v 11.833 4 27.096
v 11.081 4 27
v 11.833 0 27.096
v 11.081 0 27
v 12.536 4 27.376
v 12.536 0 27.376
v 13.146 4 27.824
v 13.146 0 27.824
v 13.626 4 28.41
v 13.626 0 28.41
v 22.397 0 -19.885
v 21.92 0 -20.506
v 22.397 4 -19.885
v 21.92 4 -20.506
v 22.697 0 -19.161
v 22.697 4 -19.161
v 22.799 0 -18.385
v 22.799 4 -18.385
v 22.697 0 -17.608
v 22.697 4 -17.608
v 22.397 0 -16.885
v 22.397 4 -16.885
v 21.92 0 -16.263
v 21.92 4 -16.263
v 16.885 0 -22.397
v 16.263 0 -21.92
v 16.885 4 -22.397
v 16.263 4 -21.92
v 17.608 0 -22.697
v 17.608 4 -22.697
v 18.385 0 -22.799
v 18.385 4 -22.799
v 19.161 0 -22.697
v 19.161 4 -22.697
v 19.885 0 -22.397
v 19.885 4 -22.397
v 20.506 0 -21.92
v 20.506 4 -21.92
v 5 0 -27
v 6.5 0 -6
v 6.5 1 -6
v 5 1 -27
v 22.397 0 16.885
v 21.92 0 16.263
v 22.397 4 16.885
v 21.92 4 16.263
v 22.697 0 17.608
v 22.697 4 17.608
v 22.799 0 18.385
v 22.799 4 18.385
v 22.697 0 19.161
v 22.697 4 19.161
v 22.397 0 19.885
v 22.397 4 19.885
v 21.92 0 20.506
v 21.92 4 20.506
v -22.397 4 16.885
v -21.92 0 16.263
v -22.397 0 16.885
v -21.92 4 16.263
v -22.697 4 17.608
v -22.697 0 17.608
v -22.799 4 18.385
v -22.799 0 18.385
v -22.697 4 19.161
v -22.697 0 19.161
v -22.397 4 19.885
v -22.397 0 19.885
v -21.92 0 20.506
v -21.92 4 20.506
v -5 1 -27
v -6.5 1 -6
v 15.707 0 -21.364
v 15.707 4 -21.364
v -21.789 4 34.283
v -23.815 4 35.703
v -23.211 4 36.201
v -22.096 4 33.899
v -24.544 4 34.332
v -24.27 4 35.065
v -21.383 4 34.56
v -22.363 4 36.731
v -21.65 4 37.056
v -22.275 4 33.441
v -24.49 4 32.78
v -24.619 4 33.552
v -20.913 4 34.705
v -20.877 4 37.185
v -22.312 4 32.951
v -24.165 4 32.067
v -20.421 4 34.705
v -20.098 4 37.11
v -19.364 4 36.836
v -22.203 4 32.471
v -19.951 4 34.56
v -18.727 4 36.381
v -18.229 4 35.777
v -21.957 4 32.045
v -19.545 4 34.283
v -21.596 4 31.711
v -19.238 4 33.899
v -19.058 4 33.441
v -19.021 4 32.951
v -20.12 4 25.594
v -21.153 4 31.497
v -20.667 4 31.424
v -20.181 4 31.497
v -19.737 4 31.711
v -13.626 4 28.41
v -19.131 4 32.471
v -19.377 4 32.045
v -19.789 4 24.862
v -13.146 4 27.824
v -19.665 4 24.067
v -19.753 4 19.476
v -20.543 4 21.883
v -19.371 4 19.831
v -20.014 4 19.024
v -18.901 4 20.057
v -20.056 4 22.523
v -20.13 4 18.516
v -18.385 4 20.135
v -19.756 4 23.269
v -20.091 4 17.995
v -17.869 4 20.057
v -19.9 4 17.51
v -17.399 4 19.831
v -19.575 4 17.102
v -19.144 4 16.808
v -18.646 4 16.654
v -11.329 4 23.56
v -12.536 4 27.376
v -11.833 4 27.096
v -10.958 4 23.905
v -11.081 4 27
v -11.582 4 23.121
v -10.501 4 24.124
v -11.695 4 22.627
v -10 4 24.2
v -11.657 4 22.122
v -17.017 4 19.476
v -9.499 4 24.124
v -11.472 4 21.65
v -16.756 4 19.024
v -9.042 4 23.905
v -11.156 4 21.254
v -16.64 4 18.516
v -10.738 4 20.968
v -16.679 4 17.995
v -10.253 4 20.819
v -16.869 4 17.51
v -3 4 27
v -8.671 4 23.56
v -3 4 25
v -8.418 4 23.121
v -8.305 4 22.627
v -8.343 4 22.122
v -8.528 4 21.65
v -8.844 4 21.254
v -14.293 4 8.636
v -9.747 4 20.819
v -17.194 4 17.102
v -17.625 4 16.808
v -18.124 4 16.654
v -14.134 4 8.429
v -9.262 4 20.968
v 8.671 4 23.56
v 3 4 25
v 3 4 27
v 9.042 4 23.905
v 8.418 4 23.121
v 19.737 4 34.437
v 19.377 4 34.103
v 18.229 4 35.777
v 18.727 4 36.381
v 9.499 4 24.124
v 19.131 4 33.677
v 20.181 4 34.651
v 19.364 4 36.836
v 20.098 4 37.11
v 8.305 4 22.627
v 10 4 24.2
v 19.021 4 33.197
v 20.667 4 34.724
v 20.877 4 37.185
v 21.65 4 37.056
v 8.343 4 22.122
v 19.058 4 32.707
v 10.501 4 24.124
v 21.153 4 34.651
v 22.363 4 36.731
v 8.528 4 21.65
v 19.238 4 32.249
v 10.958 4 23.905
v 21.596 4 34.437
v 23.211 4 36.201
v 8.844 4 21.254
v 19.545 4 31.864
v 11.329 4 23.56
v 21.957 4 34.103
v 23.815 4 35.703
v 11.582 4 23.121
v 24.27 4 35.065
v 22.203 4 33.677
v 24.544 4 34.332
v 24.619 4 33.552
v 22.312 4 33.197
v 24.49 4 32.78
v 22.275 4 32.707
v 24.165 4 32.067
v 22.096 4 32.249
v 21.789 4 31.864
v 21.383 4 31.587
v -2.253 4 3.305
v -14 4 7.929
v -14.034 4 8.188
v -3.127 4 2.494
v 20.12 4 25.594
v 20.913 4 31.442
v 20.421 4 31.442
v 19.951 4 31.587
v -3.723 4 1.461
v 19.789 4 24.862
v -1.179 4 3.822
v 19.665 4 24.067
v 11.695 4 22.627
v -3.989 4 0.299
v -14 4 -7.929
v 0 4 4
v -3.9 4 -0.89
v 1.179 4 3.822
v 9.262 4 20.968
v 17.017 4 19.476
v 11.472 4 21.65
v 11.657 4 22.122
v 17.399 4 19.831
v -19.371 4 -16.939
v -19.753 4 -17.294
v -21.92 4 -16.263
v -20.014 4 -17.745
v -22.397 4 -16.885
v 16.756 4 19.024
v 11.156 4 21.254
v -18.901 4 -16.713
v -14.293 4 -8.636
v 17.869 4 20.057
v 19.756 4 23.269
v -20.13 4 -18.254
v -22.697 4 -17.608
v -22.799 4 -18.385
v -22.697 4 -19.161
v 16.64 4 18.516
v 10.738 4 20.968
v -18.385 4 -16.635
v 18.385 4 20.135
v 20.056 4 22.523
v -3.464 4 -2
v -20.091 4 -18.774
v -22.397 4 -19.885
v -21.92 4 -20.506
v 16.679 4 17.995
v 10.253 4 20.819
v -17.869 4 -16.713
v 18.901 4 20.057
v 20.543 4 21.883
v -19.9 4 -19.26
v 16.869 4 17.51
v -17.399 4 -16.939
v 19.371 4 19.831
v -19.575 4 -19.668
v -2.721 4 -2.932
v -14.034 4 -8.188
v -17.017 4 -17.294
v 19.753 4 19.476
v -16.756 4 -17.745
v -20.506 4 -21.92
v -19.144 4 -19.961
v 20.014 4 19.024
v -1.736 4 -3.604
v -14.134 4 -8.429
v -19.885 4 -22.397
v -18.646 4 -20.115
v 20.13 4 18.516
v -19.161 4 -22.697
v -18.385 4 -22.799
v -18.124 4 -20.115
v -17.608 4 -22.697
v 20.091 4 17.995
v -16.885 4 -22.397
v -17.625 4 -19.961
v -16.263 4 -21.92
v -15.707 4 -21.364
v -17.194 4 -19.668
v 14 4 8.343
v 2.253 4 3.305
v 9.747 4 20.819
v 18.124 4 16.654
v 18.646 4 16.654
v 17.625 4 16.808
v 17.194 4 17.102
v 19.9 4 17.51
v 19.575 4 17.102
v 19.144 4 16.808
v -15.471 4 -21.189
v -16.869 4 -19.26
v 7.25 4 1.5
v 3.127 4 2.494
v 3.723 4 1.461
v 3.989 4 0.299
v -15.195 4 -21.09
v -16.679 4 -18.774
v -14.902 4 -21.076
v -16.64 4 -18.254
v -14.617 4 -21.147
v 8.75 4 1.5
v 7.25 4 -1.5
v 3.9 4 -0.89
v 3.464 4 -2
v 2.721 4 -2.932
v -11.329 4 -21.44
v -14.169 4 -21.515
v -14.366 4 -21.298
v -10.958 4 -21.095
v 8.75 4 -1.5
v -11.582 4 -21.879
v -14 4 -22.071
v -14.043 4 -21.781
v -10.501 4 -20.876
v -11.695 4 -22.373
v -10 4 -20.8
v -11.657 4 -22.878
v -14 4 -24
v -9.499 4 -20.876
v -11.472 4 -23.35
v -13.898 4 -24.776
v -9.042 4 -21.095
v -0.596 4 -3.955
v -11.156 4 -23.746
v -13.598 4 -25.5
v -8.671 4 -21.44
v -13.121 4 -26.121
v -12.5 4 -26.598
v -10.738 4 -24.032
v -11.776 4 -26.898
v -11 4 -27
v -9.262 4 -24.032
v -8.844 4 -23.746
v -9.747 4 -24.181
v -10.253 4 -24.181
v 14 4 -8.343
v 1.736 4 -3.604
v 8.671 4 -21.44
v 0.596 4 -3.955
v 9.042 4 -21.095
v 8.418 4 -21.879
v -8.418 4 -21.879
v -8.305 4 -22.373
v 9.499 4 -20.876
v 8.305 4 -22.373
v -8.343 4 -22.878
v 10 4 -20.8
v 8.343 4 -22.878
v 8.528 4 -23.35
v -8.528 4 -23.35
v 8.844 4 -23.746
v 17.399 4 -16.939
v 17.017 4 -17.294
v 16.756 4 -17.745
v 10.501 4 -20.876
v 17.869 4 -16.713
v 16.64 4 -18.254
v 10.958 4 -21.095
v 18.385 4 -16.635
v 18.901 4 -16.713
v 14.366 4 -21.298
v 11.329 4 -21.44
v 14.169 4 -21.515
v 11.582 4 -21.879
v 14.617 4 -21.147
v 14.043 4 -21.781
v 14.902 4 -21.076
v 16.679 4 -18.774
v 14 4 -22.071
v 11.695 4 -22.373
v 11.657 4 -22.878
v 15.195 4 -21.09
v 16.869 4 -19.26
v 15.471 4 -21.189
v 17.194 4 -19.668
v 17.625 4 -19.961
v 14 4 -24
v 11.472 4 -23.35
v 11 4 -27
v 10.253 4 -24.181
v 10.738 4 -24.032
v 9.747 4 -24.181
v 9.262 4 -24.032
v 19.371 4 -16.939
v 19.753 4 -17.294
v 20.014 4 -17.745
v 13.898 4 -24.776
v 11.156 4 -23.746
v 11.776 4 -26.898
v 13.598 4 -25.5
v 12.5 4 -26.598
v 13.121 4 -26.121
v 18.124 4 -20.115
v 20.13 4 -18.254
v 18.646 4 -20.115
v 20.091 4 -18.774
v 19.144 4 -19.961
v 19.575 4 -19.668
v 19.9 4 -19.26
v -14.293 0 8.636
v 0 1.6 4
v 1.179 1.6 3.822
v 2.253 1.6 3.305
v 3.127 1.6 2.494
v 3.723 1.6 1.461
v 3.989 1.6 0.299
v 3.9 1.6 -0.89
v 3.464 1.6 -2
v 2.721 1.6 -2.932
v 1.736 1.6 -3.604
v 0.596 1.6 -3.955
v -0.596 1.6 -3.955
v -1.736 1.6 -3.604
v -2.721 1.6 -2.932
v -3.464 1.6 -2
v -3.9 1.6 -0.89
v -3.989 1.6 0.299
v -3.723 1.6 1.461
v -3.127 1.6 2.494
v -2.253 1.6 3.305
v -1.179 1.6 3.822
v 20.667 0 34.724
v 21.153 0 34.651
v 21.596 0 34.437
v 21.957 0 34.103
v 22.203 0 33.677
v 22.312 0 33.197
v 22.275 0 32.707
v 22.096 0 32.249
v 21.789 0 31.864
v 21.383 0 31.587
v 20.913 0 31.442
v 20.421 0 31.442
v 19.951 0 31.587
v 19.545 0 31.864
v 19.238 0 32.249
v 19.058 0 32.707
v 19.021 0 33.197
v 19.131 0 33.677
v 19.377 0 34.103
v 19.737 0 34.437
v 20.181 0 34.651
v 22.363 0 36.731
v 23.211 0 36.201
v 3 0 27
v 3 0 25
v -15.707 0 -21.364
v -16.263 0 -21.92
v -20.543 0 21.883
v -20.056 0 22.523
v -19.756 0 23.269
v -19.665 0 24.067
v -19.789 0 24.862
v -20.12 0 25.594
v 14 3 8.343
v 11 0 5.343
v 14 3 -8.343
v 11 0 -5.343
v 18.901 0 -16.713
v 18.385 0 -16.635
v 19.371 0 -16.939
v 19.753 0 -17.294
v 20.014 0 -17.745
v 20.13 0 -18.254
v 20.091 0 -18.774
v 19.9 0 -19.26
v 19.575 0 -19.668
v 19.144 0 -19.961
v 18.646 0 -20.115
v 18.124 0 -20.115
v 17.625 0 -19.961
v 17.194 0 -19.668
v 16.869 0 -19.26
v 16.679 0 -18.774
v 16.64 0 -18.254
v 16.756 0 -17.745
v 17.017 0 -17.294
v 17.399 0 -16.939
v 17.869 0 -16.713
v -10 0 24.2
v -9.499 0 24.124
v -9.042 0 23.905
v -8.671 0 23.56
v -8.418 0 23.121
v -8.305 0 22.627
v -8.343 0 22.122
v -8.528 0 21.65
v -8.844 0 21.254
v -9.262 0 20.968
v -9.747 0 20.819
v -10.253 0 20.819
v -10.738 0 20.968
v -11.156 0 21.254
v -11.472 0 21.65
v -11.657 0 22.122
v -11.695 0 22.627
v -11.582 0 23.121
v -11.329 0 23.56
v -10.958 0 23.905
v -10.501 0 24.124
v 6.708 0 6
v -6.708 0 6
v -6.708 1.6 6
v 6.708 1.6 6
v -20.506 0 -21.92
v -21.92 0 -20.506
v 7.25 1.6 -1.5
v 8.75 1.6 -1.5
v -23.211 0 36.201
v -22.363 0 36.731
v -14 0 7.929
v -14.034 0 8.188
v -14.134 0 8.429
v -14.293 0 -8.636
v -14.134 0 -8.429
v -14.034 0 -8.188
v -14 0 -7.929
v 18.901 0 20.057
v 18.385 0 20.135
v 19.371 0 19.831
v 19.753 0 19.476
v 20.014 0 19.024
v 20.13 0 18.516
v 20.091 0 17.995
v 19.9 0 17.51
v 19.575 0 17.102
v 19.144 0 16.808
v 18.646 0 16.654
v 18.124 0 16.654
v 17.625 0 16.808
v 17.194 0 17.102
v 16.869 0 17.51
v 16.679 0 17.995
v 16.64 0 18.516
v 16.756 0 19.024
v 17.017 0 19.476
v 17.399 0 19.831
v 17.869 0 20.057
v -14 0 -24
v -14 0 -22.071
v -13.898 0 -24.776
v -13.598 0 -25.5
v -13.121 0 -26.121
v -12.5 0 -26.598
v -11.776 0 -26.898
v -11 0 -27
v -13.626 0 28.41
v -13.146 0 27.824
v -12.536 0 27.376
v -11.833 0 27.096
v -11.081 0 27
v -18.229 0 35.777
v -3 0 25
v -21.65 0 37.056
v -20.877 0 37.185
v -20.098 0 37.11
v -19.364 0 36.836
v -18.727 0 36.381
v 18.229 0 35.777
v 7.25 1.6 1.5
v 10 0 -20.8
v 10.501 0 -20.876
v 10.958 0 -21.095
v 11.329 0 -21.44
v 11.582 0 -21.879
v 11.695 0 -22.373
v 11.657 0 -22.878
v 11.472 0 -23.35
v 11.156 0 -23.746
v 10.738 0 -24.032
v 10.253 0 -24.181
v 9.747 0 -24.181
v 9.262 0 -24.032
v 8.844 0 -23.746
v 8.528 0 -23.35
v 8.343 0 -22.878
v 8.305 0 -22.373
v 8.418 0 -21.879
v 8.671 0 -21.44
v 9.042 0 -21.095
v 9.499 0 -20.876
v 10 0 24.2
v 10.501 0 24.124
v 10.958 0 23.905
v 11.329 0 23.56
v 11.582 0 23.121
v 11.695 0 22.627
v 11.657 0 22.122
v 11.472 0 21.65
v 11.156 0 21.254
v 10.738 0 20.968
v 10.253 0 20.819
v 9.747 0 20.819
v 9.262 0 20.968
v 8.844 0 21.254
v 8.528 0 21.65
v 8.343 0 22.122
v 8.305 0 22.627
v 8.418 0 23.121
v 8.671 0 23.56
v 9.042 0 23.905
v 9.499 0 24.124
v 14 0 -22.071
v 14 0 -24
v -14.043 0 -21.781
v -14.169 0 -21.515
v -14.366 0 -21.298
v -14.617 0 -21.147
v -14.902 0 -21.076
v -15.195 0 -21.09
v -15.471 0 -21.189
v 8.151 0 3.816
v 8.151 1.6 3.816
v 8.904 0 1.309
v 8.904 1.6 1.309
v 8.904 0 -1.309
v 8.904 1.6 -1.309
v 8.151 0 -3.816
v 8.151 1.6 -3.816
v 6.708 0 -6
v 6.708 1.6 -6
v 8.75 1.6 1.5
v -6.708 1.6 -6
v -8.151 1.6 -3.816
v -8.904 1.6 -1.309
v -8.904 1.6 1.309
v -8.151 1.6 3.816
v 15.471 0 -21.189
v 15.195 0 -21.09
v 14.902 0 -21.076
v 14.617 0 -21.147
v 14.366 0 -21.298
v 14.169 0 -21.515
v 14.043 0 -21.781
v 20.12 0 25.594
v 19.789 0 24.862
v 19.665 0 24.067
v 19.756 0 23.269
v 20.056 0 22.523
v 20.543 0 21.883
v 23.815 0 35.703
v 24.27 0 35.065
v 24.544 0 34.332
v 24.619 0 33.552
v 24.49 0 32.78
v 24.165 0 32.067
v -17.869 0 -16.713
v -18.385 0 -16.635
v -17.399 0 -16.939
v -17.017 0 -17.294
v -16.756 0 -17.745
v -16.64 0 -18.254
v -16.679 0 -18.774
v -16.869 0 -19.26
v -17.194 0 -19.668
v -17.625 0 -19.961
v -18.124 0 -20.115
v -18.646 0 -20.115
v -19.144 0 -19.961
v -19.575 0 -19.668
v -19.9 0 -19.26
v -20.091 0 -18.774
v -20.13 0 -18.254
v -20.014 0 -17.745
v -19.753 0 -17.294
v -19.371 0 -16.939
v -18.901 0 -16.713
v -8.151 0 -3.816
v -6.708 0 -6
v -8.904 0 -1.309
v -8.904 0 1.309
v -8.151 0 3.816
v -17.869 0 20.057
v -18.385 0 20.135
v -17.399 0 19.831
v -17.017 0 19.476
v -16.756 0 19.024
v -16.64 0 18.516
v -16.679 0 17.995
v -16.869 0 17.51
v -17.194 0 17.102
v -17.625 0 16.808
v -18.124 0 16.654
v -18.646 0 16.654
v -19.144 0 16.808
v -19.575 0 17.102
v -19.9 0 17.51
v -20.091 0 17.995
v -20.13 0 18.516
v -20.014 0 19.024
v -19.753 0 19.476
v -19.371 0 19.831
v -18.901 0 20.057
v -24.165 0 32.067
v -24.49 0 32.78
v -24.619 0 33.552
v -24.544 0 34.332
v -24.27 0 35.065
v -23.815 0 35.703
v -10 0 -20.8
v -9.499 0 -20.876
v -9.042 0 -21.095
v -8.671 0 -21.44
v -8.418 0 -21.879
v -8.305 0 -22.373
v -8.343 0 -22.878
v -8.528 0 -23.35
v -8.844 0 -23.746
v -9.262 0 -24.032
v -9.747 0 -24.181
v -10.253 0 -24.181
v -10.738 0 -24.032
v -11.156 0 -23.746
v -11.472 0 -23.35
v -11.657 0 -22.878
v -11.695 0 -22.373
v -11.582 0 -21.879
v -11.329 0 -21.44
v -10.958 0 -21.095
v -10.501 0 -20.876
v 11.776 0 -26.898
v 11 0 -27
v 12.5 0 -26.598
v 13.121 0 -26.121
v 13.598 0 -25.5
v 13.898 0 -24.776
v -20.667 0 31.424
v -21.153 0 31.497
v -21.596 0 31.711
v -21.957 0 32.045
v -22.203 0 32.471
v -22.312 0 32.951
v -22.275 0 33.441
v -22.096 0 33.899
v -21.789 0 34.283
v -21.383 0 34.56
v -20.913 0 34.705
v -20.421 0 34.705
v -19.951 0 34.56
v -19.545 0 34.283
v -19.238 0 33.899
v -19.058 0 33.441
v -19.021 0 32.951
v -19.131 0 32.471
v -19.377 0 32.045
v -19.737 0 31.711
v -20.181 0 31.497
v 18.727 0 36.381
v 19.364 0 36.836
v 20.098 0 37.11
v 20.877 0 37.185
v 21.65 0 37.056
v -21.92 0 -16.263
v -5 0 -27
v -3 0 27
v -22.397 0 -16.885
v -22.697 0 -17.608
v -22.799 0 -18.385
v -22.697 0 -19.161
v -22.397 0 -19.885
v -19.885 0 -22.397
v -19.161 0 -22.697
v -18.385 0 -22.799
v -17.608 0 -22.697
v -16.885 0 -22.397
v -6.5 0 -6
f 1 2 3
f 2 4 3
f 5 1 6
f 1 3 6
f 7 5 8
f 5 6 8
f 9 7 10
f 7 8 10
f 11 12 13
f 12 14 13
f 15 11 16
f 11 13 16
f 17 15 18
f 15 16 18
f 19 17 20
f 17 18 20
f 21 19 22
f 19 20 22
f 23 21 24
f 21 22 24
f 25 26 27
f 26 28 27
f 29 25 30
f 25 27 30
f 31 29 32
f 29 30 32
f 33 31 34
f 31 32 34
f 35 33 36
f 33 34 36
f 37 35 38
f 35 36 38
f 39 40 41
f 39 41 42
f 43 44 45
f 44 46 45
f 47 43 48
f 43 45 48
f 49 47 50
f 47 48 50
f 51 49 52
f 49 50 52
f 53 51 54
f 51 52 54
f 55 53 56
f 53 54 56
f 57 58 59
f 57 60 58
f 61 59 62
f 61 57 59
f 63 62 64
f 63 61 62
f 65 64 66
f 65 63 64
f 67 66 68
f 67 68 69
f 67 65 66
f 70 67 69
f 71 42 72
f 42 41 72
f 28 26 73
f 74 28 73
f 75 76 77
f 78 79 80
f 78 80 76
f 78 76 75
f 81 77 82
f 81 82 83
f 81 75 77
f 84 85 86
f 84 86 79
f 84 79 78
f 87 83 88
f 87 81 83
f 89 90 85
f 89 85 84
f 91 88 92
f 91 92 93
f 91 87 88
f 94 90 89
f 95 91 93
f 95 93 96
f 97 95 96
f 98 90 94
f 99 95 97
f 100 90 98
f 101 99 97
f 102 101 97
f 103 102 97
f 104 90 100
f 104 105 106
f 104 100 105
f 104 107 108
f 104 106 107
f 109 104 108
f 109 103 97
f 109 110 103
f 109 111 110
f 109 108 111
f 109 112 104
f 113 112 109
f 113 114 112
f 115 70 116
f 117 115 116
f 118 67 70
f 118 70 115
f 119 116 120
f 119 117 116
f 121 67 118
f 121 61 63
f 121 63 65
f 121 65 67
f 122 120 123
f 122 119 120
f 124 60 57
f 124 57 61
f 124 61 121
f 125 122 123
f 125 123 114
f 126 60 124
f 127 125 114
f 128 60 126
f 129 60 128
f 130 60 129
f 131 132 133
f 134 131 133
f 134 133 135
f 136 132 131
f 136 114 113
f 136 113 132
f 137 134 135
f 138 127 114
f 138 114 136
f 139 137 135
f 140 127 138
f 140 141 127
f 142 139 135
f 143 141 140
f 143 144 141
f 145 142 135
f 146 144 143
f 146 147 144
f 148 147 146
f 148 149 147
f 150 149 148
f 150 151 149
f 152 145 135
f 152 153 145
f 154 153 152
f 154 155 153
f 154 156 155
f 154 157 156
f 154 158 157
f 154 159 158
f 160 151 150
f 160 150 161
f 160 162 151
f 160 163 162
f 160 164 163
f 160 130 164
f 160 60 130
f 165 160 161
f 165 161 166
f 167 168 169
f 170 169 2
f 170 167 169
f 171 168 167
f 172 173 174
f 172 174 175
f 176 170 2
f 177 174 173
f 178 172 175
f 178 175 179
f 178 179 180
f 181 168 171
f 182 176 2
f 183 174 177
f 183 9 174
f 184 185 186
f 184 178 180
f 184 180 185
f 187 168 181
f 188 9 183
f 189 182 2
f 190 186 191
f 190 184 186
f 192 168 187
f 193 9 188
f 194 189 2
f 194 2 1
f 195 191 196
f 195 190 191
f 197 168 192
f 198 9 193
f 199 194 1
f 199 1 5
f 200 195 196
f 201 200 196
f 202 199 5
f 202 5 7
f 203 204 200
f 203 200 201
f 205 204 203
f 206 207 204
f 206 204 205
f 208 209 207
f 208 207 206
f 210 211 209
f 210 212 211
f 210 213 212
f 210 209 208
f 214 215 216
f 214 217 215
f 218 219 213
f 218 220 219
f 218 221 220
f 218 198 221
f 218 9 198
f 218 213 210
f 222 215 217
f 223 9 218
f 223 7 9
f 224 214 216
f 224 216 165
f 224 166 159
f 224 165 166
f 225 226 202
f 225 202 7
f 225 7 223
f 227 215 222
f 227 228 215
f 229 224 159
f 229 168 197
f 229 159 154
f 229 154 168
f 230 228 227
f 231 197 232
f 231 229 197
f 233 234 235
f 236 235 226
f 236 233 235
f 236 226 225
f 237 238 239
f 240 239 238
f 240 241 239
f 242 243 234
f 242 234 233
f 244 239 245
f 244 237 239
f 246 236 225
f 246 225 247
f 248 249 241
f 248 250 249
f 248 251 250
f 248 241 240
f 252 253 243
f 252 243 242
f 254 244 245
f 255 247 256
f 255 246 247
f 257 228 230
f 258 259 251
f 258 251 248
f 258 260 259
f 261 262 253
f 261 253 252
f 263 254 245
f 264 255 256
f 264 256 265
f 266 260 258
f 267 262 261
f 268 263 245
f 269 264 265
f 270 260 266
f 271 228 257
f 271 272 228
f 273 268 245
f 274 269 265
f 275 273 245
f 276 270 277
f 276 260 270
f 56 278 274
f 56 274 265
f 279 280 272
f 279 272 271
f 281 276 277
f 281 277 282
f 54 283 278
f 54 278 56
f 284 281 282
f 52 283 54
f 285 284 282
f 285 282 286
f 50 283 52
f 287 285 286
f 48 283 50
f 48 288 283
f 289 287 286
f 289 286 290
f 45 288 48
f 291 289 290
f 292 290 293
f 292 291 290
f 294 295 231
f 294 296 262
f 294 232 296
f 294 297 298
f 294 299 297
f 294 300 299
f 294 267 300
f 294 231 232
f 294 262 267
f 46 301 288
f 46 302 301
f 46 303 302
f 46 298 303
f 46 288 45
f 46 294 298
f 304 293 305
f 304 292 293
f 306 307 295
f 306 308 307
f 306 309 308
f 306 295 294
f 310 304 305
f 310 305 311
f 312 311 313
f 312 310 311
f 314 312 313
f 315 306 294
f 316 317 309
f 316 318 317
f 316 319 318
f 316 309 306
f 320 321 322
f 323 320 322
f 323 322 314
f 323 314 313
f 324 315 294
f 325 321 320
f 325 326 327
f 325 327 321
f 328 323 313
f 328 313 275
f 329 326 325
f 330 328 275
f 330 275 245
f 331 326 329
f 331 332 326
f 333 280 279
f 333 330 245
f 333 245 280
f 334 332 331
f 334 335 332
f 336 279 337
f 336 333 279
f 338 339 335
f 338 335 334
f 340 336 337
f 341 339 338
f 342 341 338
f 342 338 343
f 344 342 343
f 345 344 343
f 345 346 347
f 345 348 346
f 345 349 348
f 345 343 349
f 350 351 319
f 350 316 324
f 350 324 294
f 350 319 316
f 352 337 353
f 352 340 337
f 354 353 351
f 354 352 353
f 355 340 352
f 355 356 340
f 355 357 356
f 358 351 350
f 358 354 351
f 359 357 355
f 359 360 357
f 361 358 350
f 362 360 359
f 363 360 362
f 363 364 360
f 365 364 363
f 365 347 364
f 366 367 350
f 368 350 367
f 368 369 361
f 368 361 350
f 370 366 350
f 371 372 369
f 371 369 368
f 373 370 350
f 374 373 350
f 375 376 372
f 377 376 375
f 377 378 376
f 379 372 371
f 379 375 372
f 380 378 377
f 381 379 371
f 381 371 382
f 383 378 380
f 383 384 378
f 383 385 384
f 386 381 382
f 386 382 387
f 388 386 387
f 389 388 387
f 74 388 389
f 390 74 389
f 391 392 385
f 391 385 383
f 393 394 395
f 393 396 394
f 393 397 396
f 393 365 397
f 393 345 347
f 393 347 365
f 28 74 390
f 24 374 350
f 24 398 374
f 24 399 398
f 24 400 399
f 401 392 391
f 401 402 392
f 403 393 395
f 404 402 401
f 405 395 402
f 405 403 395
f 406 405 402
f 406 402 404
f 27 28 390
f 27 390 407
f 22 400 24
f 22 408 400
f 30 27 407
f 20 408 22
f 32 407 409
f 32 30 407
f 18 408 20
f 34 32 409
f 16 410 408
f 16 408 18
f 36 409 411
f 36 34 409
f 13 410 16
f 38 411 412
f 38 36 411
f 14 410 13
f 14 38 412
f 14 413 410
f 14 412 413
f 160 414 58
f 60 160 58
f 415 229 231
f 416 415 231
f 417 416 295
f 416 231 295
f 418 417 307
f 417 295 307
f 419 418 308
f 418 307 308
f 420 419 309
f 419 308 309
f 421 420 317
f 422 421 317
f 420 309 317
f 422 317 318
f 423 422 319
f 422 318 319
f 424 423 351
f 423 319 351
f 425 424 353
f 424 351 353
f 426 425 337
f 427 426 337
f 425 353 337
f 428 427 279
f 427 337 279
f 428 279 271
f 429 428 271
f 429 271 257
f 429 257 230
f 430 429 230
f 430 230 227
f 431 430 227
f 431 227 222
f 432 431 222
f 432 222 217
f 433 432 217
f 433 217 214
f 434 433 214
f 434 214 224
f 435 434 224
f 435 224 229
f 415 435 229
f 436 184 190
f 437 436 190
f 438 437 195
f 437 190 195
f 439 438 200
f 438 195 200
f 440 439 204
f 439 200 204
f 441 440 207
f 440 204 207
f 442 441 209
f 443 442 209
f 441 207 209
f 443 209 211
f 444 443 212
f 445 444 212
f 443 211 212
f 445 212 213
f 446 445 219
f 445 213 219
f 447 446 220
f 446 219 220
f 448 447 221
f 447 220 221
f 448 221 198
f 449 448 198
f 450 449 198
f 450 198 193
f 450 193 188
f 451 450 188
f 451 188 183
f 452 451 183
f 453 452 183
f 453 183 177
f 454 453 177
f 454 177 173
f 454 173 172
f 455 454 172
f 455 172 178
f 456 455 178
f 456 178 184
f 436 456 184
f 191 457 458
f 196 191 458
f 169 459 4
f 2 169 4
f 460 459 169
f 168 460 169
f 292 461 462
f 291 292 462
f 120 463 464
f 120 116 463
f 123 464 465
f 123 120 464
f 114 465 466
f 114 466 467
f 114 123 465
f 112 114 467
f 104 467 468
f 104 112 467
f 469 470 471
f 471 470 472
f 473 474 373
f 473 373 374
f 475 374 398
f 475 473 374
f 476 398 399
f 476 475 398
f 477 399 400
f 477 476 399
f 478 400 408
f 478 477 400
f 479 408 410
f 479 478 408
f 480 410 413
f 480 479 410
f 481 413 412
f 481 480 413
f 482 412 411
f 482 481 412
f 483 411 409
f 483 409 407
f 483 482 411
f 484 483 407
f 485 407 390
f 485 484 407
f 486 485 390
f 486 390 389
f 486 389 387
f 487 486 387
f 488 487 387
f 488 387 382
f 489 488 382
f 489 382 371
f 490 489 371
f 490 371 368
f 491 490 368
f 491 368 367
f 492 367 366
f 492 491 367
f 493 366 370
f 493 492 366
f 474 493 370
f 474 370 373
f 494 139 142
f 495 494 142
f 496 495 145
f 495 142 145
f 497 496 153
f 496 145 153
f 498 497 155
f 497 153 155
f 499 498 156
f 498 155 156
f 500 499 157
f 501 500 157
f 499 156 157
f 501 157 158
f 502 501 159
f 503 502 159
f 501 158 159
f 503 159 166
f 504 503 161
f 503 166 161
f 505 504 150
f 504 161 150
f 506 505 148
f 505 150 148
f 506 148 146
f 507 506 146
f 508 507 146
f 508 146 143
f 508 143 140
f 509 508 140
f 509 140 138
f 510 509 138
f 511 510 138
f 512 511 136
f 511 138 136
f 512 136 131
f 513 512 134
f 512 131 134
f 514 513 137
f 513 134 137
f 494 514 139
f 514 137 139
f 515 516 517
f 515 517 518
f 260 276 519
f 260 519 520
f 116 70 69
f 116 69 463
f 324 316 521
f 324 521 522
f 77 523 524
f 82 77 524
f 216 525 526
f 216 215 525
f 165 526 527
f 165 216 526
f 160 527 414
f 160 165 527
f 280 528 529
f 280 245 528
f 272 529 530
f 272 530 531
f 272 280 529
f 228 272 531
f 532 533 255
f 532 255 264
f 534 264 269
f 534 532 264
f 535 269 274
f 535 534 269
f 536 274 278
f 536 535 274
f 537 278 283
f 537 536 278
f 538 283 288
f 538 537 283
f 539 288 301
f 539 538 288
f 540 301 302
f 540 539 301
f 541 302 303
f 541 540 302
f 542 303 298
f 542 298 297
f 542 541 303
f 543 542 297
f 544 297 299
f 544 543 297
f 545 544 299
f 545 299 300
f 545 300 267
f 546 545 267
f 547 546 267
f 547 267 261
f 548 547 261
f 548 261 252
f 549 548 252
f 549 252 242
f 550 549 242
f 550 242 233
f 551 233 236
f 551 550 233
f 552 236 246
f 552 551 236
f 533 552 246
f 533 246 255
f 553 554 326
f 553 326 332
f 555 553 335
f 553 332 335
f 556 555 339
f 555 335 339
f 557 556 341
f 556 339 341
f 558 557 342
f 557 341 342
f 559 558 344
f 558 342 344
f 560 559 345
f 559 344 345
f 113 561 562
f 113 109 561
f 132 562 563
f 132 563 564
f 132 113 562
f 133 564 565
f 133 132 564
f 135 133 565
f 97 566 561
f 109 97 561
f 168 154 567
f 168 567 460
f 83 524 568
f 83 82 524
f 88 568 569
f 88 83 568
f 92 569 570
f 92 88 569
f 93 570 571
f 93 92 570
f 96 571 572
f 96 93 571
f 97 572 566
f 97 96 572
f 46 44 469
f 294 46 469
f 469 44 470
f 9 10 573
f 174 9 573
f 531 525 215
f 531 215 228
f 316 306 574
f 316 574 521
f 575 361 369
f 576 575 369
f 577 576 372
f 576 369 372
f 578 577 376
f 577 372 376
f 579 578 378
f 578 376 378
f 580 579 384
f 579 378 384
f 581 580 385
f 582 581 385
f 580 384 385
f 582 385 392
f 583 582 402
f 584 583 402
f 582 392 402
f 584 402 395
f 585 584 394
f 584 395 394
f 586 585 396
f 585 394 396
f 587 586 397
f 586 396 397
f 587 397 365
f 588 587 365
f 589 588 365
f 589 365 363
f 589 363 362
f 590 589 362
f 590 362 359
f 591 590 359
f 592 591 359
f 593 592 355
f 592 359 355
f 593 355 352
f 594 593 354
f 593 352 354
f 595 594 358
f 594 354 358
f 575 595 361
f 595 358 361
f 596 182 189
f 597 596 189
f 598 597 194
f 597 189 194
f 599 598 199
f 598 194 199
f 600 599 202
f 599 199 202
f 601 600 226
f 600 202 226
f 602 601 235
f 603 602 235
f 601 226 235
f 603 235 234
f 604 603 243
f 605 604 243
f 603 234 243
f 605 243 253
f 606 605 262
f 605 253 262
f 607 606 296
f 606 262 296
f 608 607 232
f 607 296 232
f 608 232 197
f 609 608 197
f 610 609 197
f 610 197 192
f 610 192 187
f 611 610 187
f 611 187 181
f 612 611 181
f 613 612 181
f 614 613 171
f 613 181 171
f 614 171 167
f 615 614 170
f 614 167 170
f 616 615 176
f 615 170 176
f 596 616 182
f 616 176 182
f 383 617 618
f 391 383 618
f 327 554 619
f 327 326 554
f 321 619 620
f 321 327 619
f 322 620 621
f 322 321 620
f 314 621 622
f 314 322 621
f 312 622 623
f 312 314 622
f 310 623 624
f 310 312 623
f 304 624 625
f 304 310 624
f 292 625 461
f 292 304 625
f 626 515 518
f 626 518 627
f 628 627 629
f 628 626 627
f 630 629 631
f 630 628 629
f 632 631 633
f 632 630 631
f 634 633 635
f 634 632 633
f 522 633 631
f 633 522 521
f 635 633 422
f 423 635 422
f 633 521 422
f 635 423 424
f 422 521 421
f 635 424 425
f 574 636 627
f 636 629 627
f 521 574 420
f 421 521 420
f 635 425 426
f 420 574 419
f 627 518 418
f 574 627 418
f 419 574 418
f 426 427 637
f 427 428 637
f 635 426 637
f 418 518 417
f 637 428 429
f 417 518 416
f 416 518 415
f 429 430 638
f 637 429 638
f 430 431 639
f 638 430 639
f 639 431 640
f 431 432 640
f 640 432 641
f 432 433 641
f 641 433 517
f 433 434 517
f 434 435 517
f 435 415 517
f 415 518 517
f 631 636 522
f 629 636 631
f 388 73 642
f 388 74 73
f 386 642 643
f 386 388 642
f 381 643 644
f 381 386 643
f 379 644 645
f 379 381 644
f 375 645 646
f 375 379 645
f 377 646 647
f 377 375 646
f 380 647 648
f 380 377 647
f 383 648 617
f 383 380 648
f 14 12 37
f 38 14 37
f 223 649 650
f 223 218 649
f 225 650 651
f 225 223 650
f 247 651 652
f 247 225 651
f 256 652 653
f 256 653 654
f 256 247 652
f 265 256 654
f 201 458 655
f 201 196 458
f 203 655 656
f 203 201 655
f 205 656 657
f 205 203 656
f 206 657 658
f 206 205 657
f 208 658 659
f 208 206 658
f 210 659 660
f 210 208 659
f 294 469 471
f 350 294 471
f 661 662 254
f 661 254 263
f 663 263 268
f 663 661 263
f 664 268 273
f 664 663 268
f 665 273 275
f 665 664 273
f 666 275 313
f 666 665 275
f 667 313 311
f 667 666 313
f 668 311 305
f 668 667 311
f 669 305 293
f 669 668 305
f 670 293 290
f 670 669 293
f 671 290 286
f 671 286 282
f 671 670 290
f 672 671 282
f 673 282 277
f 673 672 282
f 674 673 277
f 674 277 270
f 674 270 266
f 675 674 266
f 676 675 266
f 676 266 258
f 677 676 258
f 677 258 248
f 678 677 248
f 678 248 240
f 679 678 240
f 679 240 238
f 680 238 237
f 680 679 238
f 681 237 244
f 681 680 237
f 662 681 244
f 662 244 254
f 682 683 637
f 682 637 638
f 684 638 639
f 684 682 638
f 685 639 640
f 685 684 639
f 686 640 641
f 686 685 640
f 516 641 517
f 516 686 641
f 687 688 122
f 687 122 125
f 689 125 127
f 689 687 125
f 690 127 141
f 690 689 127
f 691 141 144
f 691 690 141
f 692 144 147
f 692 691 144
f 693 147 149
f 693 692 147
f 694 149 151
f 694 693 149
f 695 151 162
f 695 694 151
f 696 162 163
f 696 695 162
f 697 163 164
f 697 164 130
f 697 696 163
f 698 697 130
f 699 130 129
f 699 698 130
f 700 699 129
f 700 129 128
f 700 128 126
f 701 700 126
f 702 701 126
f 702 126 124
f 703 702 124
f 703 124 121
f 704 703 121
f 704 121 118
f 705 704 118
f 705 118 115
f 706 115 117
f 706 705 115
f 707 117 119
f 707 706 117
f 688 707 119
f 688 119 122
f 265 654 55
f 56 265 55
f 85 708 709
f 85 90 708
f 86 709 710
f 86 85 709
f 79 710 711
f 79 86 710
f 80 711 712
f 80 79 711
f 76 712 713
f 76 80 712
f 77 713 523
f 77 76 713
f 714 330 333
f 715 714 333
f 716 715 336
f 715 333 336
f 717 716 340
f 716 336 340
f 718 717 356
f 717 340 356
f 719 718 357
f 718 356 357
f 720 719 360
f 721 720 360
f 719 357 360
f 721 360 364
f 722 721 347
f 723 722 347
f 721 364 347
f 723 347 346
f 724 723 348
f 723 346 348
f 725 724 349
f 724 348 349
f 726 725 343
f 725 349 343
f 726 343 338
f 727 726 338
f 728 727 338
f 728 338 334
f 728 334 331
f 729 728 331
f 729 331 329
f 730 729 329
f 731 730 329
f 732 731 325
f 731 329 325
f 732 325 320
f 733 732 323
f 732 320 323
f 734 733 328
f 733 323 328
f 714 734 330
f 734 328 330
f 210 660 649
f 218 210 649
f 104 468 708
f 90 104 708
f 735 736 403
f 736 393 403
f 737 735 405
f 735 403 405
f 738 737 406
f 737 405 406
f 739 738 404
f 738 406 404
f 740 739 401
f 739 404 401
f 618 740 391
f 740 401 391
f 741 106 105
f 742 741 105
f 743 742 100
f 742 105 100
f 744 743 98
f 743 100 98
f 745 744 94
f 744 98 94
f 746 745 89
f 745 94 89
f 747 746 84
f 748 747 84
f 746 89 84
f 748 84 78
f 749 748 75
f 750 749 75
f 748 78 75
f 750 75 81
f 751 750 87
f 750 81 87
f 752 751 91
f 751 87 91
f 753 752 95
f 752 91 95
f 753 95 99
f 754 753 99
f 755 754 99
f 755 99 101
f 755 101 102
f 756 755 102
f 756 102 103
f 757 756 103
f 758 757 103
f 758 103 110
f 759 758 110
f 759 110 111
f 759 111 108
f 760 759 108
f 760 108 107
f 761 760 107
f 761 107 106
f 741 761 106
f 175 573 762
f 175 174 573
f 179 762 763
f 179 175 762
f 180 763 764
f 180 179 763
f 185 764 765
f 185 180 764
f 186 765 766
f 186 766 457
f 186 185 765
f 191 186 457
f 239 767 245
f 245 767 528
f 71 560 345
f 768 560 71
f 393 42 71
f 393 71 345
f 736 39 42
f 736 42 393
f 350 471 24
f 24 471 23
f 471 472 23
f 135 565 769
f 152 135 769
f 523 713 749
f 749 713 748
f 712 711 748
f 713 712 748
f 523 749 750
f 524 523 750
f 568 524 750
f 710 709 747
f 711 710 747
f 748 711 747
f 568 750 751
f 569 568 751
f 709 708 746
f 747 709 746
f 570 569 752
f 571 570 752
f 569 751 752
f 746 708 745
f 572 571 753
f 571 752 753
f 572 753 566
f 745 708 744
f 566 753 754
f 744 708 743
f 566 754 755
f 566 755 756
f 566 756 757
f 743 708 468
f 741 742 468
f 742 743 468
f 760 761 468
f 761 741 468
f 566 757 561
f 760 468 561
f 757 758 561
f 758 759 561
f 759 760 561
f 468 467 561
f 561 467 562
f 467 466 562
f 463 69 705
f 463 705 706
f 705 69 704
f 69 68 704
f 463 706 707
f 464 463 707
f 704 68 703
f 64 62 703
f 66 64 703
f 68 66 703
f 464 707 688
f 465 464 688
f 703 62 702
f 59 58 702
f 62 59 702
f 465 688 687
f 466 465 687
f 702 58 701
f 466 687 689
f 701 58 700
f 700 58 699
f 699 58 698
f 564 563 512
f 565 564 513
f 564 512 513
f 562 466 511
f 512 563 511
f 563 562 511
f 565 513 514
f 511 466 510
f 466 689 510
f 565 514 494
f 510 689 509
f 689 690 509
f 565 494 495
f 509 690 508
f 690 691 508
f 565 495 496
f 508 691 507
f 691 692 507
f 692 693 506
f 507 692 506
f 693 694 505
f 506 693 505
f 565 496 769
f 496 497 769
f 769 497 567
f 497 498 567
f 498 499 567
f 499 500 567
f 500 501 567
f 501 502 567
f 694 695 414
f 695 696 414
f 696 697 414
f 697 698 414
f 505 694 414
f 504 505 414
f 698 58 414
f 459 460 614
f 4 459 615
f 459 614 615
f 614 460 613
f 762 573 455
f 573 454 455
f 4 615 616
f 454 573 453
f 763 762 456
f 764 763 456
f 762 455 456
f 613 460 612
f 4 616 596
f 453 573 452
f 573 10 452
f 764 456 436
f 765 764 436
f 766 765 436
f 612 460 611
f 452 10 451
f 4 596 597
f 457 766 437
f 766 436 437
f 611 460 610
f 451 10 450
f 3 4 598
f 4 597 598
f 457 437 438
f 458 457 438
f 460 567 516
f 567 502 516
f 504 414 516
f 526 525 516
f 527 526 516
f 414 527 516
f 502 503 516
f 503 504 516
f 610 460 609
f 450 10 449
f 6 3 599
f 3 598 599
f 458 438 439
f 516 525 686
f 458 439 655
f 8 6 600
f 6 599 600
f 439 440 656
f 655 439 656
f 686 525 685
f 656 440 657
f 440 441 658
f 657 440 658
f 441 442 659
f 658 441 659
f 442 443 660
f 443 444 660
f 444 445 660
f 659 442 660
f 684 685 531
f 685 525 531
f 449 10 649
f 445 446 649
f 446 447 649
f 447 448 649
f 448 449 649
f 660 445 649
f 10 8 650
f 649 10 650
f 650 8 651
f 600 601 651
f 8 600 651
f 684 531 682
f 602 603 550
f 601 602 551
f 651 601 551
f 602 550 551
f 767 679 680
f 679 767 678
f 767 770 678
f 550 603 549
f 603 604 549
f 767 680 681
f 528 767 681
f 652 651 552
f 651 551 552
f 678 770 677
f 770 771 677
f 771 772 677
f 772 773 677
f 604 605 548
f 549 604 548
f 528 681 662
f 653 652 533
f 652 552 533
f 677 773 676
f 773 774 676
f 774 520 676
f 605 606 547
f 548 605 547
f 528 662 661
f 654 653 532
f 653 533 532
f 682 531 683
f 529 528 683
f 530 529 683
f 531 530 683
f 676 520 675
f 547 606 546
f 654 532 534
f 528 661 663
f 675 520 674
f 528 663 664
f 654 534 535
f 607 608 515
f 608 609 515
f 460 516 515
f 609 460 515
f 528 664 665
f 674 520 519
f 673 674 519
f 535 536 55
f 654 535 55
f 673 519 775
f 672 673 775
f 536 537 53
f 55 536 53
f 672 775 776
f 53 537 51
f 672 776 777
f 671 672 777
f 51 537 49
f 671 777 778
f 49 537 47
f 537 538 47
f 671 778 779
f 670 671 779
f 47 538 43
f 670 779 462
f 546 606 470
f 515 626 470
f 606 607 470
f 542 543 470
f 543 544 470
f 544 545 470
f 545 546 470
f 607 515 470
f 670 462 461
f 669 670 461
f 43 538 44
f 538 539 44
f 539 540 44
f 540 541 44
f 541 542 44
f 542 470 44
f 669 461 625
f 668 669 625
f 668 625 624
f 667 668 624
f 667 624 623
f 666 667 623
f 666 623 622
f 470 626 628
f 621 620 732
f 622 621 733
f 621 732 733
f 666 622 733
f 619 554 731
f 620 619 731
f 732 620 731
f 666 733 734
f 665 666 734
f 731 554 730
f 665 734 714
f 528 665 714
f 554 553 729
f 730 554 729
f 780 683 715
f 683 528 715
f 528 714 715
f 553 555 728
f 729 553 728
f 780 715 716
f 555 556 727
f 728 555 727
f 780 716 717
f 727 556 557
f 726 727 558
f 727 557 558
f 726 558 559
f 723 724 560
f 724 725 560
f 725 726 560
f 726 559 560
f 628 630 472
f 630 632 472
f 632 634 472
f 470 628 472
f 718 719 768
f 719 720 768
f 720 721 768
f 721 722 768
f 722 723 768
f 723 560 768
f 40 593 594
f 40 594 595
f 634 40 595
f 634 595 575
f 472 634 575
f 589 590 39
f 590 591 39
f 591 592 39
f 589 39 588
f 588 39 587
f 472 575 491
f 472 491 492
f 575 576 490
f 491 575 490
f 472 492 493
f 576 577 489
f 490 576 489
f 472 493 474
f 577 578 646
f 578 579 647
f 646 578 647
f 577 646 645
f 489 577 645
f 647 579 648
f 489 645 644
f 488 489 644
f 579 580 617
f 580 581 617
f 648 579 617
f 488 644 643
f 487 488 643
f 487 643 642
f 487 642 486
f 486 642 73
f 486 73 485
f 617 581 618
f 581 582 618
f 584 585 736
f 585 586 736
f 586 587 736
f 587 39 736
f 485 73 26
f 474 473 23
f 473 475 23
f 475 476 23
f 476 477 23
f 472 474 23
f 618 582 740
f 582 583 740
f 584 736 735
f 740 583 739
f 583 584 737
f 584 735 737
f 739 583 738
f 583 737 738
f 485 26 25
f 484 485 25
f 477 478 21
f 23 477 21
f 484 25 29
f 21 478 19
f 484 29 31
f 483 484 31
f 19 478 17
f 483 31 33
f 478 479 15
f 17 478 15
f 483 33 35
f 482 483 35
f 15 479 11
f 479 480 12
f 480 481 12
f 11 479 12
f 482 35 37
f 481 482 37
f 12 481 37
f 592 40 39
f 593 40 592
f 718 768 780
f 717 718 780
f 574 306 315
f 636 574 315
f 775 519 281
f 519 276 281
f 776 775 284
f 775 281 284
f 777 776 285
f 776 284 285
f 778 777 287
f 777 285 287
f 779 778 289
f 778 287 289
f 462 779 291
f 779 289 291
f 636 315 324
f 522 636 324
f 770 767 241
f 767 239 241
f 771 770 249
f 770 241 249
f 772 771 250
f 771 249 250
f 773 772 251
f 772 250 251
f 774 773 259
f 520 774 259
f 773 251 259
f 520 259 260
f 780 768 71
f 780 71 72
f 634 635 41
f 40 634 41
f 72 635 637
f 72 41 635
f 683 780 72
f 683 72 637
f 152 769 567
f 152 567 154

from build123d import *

# Parameters (mm, degrees)
SKETCH1_W           = 28
SKETCH1_H           = 54
BOSS_EXTRUDE1_DEPTH = 4
BOSS_EXTRUDE4_DEPTH = 4
SKETCH2_R           = 1.75
BOSS_EXTRUDE2_DEPTH = 4
SKETCH3_R           = 1.7
CUT_EXTRUDE1_DEPTH  = 4
CUT_EXTRUDE2_REACH  = 48.344
SKETCH4_R           = 4
SKETCH4_W           = 1.5
SKETCH4_H           = 3
CUT_EXTRUDE3_DEPTH  = 1.6
CHAMFER1_SIZE       = 3
FILLET1_R           = 3
FILLET2_R           = 1
SKETCH7_W           = 6
SKETCH7_H           = 4
CUT_EXTRUDE4_DEPTH  = 2
CUT_EXTRUDE5_DEPTH  = 1
CUT_EXTRUDE6_REACH  = 46.778
SKETCH9_R           = 1.65


with BuildPart() as part:
    # Sketch1 → Boss-Extrude1 (new body)
    with BuildSketch(Plane(origin=(0, 0, 0), x_dir=(1, 0, 0), z_dir=(0, 1, 0))):
        Rectangle(SKETCH1_W, SKETCH1_H)
    extrude(amount=BOSS_EXTRUDE1_DEPTH)

    # Sketch10 → Boss-Extrude4 (add)
    with BuildSketch(Plane(origin=(0, 0, 0), x_dir=(1, 0, 0), z_dir=(0, 1, 0))):
        Polygon((2.968168337, 1.854717425), (0, 0), (2.968168337, -1.854717425), (0, -6.604779702), (19.818360025, -38.32078556), (25.754696699, -34.61135071), align=None)
        Polygon((0, -6.604779702), (-2.968168337, -1.854717425), (0, 0), (-2.968168337, 1.854717425), (-25.754696699, -34.61135071), (-19.818360025, -38.32078556), align=None)
    extrude(amount=BOSS_EXTRUDE4_DEPTH)

    # Sketch2 → Boss-Extrude2 (add)
    # profile 1 of 4: a face of its own
    with BuildSketch(Plane(origin=(0, 0, 0), x_dir=(1, 0, 0), z_dir=(0, 1, 0))):
        Polygon((14, 19.656854249), (14, 8.343145751), (24.04163056, 18.384776311), (18.384776311, 24.04163056), align=None)
        with Locations(Location((18.384776311, 18.384776311, 0), (0, 0, 270))):
            Circle(SKETCH2_R, mode=Mode.SUBTRACT)
    # profile 2 of 4: a face of its own
    with BuildSketch(Plane(origin=(0, 0, 0), x_dir=(1, 0, 0), z_dir=(0, 1, 0))):
        Polygon((24.04163056, -18.384776311), (14, -8.343145751), (14, -15.799903705), (18.85572261, -23.570684261), align=None)
        with Locations(Location((18.384776311, -18.384776311, 0), (0, 0, 270))):
            Circle(SKETCH2_R, mode=Mode.SUBTRACT)
    # profile 3 of 4: a face of its own
    with BuildSketch(Plane(origin=(0, 0, 0), x_dir=(1, 0, 0), z_dir=(0, 1, 0))):
        Polygon((-24.04163056, -18.384776311), (-18.85572261, -23.570684261), (-14, -15.799903705), (-14, -8.343145751), align=None)
        with Locations(Location((-18.384776311, -18.384776311, 0), (0, 0, 270))):
            Circle(SKETCH2_R, mode=Mode.SUBTRACT)
    # profile 4 of 4: a face of its own
    with BuildSketch(Plane(origin=(0, 0, 0), x_dir=(1, 0, 0), z_dir=(0, 1, 0))):
        Polygon((-14, 8.343145751), (-14, 19.656854249), (-18.384776311, 24.04163056), (-24.04163056, 18.384776311), align=None)
        with Locations(Location((-18.384776311, 18.384776311, 0), (0, 0, 270))):
            Circle(SKETCH2_R, mode=Mode.SUBTRACT)
    extrude(amount=BOSS_EXTRUDE2_DEPTH)

    # Sketch3 → Cut-Extrude1 (cut)
    with BuildSketch(Plane(origin=(0, 4, 0), x_dir=(1, 0, 0), z_dir=(0, 1, 0))):
        with Locations(Location((10, -22.5, 0), (0, 0, 270))):
            Circle(SKETCH3_R)
        with Locations(Location((-10, -22.5, 0), (0, 0, 270))):
            Circle(SKETCH3_R)
        with Locations(Location((-10, 22.5, 0), (0, 0, 270))):
            Circle(SKETCH3_R)
        with Locations(Location((10, 22.5, 0), (0, 0, 270))):
            Circle(SKETCH3_R)
    extrude(amount=-CUT_EXTRUDE1_DEPTH, mode=Mode.SUBTRACT)

    # Sketch4 → Cut-Extrude2 (cut, up to next)
    with BuildSketch(Plane(origin=(0, 4, 0), x_dir=(1, 0, 0), z_dir=(0, 1, 0)), mode=Mode.PRIVATE) as cut_extrude2_sk1:
        with Locations(Location((0, 0, 0), (0, 0, 270))):
            Circle(SKETCH4_R)
    cut_extrude2_tool1 = extrude(cut_extrude2_sk1.sketch, amount=-CUT_EXTRUDE2_REACH, mode=Mode.PRIVATE) & part.part
    # Sketch4 → Cut-Extrude2 (cut, up to next)
    with BuildSketch(Plane(origin=(0, 4, 0), x_dir=(1, 0, 0), z_dir=(0, 1, 0)), mode=Mode.PRIVATE) as cut_extrude2_sk2:
        with Locations((8, 0)):
            Rectangle(SKETCH4_W, SKETCH4_H)
    cut_extrude2_tool2 = extrude(cut_extrude2_sk2.sketch, amount=-CUT_EXTRUDE2_REACH, mode=Mode.PRIVATE) & part.part
    add(cut_extrude2_tool1.solids().sort_by_distance((0, 4, 0))[0], mode=Mode.SUBTRACT)
    add(cut_extrude2_tool2.solids().sort_by_distance((8, 4, 0))[0], mode=Mode.SUBTRACT)

    # Sketch5 → Cut-Extrude3 (cut)
    with BuildSketch(Plane.XZ):
        with BuildLine():
            Line((6.708203932, -6), (-6.708203932, -6))
            ThreePointArc((-6.708203932, -6), (-9, 0), (-6.708203932, 6))
            Line((-6.708203932, 6), (6.708203932, 6))
            ThreePointArc((6.708203932, 6), (9, 0), (6.708203932, -6))
        make_face()
    extrude(amount=-CUT_EXTRUDE3_DEPTH, mode=Mode.SUBTRACT)

    # Chamfer1
    chamfer1_edges = [part.edges().sort_by_distance(p)[0] for p in [
        (14, 0, 0),
    ]]
    chamfer(chamfer1_edges, length=CHAMFER1_SIZE)

    # Fillet1
    fillet1_edges = [part.edges().sort_by_distance(p)[0] for p in [
        (18.384776311, 2, -24.04163056),
        (24.04163056, 2, -18.384776311),
        (18.85572261, 2, 23.570684261),
        (24.04163056, 2, 18.384776311),
        (-18.85572261, 2, 23.570684261),
        (-24.04163056, 2, 18.384776311),
        (12.74434809, 2, 27),
        (25.754696699, 2, 34.61135071),
        (19.818360025, 2, 38.32078556),
        (-19.818360025, 2, 38.32078556),
        (-25.754696699, 2, 34.61135071),
        (-12.74434809, 2, 27),
        (-14, 2, -27),
        (-24.04163056, 2, -18.384776311),
        (14, 2, -27),
        (-18.384776311, 2, -24.04163056),
    ]]
    fillet(fillet1_edges, radius=FILLET1_R)

    # Fillet2
    fillet2_edges = [part.edges().sort_by_distance(p)[0] for p in [
        (14, 2, -19.656854249),
        (-14, 2, 8.343145751),
        (-14, 2, -19.656854249),
        (-14, 2, -8.343145751),
    ]]
    fillet(fillet2_edges, radius=FILLET2_R)

    # Sketch7 → Cut-Extrude4 (cut)
    with BuildSketch(Plane.XY.offset(27)):
        with Locations((0, 2)):
            Rectangle(SKETCH7_W, SKETCH7_H)
    extrude(amount=-CUT_EXTRUDE4_DEPTH, mode=Mode.SUBTRACT)

    # Sketch8 → Cut-Extrude5 (cut)
    with BuildSketch(Plane(origin=(0, 0, 0), x_dir=(-1, 0, 0), z_dir=(0, 1, 0))):
        Polygon((-5, -27), (5, -27), (6.5, -6), (-6.5, -6), align=None)
    extrude(amount=CUT_EXTRUDE5_DEPTH, mode=Mode.SUBTRACT)

    # Sketch9 → Cut-Extrude6 (cut, up to next)
    with BuildSketch(Plane(origin=(0, 4, 0), x_dir=(1, 0, 0), z_dir=(0, 1, 0)), mode=Mode.PRIVATE) as cut_extrude6_sk1:
        with Locations(Location((20.666851305, -33.07387575, 0), (0, 0, 270))):
            Circle(SKETCH9_R)
    cut_extrude6_tool1 = extrude(cut_extrude6_sk1.sketch, amount=-CUT_EXTRUDE6_REACH, mode=Mode.PRIVATE) & part.part
    # Sketch9 → Cut-Extrude6 (cut, up to next)
    with BuildSketch(Plane(origin=(0, 4, 0), x_dir=(1, 0, 0), z_dir=(0, 1, 0)), mode=Mode.PRIVATE) as cut_extrude6_sk2:
        with Locations(Location((-20.666851305, -33.07387575, 0), (0, 0, 90))):
            Circle(SKETCH9_R)
    cut_extrude6_tool2 = extrude(cut_extrude6_sk2.sketch, amount=-CUT_EXTRUDE6_REACH, mode=Mode.PRIVATE) & part.part
    add(cut_extrude6_tool1.solids().sort_by_distance((20.666851, 4, 33.073876))[0], mode=Mode.SUBTRACT)
    add(cut_extrude6_tool2.solids().sort_by_distance((-20.666851, 4, 33.073876))[0], mode=Mode.SUBTRACT)


solid = part.part
